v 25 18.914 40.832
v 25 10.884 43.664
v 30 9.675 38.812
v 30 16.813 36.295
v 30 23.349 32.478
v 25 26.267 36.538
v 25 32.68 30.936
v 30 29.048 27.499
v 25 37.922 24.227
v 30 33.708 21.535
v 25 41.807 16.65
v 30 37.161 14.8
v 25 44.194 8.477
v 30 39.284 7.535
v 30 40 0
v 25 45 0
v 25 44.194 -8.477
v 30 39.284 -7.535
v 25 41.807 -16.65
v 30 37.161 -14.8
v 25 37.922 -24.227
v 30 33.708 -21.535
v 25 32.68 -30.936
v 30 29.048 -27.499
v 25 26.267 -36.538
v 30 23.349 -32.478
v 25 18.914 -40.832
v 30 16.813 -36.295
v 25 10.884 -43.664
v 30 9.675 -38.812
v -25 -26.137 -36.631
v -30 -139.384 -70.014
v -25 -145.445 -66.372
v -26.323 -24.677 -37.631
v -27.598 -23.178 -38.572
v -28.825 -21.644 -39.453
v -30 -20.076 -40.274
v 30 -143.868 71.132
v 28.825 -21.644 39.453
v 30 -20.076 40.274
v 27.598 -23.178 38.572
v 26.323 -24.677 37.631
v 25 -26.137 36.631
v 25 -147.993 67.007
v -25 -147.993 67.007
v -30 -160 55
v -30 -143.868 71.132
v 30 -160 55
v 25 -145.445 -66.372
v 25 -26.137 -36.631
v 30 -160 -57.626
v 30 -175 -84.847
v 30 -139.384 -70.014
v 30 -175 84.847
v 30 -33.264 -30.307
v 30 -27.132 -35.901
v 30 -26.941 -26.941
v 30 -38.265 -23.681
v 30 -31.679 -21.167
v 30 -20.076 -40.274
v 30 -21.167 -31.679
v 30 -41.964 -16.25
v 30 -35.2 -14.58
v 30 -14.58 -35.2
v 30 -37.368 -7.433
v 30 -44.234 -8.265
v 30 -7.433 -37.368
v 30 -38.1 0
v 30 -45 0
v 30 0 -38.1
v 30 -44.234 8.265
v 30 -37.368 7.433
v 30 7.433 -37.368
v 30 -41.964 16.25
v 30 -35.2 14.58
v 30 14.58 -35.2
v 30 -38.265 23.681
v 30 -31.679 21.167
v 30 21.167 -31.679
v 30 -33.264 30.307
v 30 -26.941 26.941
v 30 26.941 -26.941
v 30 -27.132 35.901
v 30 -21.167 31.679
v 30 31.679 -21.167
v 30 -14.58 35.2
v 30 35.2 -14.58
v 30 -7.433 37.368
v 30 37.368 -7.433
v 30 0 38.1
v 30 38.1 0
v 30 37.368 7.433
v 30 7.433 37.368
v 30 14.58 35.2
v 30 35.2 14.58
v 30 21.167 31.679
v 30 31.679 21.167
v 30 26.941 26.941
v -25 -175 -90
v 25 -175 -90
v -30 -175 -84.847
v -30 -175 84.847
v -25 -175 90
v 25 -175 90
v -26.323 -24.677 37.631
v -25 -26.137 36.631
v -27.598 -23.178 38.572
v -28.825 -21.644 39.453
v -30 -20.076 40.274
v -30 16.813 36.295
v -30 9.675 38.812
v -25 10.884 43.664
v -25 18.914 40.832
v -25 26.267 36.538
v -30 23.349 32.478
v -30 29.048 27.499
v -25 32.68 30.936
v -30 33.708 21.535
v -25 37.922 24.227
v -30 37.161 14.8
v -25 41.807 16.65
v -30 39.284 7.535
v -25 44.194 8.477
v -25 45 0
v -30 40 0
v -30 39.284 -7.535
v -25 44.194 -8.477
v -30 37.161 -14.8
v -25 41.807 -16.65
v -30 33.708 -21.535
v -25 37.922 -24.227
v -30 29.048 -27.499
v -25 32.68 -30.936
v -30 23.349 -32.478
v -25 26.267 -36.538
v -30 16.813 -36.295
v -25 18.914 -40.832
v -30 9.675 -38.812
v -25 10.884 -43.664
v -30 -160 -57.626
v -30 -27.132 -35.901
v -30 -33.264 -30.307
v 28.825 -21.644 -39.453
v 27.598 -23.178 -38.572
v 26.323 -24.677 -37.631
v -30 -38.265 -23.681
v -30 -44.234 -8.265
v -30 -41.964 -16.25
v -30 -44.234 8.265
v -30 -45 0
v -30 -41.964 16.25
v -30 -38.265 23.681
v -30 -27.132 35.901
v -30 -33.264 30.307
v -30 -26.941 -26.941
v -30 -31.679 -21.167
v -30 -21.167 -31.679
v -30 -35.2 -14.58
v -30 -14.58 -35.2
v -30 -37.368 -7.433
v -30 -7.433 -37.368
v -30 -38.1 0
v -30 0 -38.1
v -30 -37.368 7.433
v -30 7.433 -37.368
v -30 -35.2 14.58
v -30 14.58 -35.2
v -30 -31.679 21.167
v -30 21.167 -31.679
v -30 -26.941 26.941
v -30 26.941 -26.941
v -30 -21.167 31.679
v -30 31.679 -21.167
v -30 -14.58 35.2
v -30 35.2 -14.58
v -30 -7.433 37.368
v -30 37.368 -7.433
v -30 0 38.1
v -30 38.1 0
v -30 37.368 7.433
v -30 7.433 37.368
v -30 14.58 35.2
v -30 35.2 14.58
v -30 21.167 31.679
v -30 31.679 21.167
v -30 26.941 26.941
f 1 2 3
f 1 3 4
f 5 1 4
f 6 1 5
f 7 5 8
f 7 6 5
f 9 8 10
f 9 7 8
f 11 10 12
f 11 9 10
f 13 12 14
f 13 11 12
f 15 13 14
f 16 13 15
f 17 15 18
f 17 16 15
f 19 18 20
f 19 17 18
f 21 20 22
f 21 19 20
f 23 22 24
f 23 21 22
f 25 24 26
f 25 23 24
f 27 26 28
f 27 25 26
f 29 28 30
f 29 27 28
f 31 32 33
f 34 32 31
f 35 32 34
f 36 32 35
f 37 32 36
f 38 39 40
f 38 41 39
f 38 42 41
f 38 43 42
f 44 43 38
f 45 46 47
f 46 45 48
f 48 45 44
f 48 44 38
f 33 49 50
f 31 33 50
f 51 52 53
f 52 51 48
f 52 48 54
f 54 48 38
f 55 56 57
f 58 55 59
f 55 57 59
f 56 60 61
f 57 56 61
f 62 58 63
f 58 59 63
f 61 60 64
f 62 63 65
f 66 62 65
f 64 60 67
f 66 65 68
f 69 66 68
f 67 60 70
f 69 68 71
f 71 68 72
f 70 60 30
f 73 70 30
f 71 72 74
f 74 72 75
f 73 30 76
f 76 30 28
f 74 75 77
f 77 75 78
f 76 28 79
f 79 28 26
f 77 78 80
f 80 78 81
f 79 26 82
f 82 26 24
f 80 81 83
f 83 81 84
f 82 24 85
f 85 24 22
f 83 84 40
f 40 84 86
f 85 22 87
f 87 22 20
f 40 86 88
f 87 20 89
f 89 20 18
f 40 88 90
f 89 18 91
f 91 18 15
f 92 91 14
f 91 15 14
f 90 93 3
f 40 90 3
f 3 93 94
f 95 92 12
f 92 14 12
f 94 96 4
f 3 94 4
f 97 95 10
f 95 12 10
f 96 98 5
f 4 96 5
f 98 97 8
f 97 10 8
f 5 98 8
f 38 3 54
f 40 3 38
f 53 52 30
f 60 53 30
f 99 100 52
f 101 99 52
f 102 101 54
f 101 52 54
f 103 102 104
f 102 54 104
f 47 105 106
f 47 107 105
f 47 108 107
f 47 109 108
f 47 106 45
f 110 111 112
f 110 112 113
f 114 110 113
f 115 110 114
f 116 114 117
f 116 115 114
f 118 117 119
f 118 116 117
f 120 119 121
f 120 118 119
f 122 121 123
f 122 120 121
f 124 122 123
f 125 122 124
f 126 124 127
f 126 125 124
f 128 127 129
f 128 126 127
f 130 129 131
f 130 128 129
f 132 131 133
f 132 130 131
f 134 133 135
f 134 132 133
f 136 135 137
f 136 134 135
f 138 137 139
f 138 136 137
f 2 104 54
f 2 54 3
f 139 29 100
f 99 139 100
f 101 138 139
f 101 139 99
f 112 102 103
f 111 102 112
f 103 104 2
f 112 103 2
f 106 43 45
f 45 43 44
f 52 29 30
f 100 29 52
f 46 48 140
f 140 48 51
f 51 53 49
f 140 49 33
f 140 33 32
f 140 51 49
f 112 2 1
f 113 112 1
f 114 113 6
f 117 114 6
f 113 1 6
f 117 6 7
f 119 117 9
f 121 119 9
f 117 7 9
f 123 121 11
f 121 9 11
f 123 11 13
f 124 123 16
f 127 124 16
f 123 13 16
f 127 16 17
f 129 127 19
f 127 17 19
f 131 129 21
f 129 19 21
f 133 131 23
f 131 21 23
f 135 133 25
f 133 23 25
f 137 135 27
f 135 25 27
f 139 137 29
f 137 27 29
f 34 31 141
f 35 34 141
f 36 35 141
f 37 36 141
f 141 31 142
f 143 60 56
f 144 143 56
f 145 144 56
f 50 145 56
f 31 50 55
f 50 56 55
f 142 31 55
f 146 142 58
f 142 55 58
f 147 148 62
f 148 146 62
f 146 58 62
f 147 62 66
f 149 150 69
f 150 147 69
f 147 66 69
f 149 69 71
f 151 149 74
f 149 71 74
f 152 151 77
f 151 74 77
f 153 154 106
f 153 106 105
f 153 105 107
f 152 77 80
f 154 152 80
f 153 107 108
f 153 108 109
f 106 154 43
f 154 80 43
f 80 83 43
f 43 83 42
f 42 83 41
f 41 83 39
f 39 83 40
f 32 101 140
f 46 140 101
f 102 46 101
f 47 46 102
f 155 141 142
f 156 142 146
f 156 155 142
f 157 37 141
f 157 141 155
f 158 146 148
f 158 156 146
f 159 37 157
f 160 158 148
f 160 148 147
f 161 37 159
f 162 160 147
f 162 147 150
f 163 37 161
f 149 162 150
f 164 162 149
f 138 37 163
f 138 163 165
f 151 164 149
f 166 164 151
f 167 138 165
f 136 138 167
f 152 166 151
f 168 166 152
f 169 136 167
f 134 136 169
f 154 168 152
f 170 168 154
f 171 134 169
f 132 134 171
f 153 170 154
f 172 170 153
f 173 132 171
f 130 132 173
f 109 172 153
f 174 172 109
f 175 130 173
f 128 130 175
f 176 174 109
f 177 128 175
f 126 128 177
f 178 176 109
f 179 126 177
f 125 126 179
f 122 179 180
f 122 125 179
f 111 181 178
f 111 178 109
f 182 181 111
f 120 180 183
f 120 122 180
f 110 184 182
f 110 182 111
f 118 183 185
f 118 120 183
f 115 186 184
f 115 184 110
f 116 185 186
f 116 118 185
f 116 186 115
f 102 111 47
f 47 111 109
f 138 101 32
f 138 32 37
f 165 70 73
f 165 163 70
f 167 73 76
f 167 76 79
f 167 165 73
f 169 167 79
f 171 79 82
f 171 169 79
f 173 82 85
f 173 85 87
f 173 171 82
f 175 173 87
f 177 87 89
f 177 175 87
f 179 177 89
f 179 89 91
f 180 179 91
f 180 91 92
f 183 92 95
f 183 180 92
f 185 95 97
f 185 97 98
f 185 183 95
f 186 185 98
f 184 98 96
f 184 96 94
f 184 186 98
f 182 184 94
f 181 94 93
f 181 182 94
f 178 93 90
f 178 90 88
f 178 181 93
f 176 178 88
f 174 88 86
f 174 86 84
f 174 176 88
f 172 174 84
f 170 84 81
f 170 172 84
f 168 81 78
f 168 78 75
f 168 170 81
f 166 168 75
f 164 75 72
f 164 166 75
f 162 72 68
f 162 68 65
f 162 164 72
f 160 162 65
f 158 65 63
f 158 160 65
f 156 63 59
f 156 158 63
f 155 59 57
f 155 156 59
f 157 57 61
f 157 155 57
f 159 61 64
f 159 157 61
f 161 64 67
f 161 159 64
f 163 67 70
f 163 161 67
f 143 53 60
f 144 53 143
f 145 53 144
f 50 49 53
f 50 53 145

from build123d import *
from OCP.BRepFilletAPI import BRepFilletAPI_MakeChamfer

# Parameters (mm, degrees)
SZKIC1_R                    = 38.1
DODANIE_WYCI_GNI_CIE1_DEPTH = 30
SFAZOWANIE1_SIZE            = 15
SFAZOWANIE1_SIZE2           = 12.374392919
SFAZOWANIE2_SIZE            = 5


with BuildPart() as part:
    # Szkic1 → Dodanie-wyciągnięcie1 (new, symmetric)
    with BuildSketch(Plane(origin=(0, 0, 0), x_dir=(0, 0, -1), z_dir=(1, 0, 0))):
        with BuildLine():
            Line((0, -175), (-90, -175))
            Line((-90, -175), (-43.663859775, 10.884270741))
            ThreePointArc((-43.663859775, 10.884270741), (0, 45), (43.663859775, 10.884270741))
            Line((43.663859775, 10.884270741), (90, -175))
            Line((90, -175), (0, -175))
        make_face()
        Circle(SZKIC1_R, mode=Mode.SUBTRACT)
        with BuildLine():
            Line((0, -160), (70, -160))
            Line((70, -160), (36.631404611, -26.136950783))
            ThreePointArc((36.631404611, -26.136950783), (0, -45), (-36.631404611, -26.136950783))
            Line((-36.631404611, -26.136950783), (-70, -160))
            Line((-70, -160), (0, -160))
        make_face(mode=Mode.SUBTRACT)
    extrude(amount=DODANIE_WYCI_GNI_CIE1_DEPTH, both=True)

    # Sfazowanie1: one chamfer whose edges measure the first distance from different faces: ONE call of the kernel's chamfer builder (chamfer() names one face for all edges)
    sfazowanie1_edges_1 = [part.edges().sort_by_distance(p)[0] for p in [
        (0, -160, 70),
    ]]
    sfazowanie1_side_1 = [part.faces().sort_by_distance(p)[0] for p in [
        (0, -160, 0),
    ]]
    sfazowanie1_edges_2 = [part.edges().sort_by_distance(p)[0] for p in [
        (0, -160, -70),
    ]]
    sfazowanie1_side_2 = [part.faces().sort_by_distance(p)[0] for p in [
        (0, -93.068475391, -53.315702306),
    ]]
    sfazowanie1 = BRepFilletAPI_MakeChamfer(part.part.solid().wrapped)
    for e in sfazowanie1_edges_1:
        sfazowanie1.Add(SFAZOWANIE1_SIZE, SFAZOWANIE1_SIZE2, e.wrapped, sfazowanie1_side_1[0].wrapped)  # the first distance lies on this face
    for e in sfazowanie1_edges_2:
        sfazowanie1.Add(SFAZOWANIE1_SIZE, SFAZOWANIE1_SIZE2, e.wrapped, sfazowanie1_side_2[0].wrapped)  # the first distance lies on this face
    add(Compound.cast(sfazowanie1.Shape()), mode=Mode.REPLACE)

    # Sfazowanie2
    sfazowanie2_edges = [part.edges().sort_by_distance(p)[0] for p in [
        (30, -82.057864629, -66.831929887),
        (30, 45, 0),
        (30, -82.057864629, 66.831929887),
        (-30, -82.057864629, -66.831929887),
        (-30, 45, 0),
        (-30, -82.057864629, 66.831929887),
        (-30, -87.0649892, 51.819188497),
        (-30, -85.791165429, -51.501657182),
        (30, -85.791165429, -51.501657182),
        (30, -87.0649892, 51.819188497),
    ]]
    chamfer(sfazowanie2_edges, length=SFAZOWANIE2_SIZE)


solid = part.part
